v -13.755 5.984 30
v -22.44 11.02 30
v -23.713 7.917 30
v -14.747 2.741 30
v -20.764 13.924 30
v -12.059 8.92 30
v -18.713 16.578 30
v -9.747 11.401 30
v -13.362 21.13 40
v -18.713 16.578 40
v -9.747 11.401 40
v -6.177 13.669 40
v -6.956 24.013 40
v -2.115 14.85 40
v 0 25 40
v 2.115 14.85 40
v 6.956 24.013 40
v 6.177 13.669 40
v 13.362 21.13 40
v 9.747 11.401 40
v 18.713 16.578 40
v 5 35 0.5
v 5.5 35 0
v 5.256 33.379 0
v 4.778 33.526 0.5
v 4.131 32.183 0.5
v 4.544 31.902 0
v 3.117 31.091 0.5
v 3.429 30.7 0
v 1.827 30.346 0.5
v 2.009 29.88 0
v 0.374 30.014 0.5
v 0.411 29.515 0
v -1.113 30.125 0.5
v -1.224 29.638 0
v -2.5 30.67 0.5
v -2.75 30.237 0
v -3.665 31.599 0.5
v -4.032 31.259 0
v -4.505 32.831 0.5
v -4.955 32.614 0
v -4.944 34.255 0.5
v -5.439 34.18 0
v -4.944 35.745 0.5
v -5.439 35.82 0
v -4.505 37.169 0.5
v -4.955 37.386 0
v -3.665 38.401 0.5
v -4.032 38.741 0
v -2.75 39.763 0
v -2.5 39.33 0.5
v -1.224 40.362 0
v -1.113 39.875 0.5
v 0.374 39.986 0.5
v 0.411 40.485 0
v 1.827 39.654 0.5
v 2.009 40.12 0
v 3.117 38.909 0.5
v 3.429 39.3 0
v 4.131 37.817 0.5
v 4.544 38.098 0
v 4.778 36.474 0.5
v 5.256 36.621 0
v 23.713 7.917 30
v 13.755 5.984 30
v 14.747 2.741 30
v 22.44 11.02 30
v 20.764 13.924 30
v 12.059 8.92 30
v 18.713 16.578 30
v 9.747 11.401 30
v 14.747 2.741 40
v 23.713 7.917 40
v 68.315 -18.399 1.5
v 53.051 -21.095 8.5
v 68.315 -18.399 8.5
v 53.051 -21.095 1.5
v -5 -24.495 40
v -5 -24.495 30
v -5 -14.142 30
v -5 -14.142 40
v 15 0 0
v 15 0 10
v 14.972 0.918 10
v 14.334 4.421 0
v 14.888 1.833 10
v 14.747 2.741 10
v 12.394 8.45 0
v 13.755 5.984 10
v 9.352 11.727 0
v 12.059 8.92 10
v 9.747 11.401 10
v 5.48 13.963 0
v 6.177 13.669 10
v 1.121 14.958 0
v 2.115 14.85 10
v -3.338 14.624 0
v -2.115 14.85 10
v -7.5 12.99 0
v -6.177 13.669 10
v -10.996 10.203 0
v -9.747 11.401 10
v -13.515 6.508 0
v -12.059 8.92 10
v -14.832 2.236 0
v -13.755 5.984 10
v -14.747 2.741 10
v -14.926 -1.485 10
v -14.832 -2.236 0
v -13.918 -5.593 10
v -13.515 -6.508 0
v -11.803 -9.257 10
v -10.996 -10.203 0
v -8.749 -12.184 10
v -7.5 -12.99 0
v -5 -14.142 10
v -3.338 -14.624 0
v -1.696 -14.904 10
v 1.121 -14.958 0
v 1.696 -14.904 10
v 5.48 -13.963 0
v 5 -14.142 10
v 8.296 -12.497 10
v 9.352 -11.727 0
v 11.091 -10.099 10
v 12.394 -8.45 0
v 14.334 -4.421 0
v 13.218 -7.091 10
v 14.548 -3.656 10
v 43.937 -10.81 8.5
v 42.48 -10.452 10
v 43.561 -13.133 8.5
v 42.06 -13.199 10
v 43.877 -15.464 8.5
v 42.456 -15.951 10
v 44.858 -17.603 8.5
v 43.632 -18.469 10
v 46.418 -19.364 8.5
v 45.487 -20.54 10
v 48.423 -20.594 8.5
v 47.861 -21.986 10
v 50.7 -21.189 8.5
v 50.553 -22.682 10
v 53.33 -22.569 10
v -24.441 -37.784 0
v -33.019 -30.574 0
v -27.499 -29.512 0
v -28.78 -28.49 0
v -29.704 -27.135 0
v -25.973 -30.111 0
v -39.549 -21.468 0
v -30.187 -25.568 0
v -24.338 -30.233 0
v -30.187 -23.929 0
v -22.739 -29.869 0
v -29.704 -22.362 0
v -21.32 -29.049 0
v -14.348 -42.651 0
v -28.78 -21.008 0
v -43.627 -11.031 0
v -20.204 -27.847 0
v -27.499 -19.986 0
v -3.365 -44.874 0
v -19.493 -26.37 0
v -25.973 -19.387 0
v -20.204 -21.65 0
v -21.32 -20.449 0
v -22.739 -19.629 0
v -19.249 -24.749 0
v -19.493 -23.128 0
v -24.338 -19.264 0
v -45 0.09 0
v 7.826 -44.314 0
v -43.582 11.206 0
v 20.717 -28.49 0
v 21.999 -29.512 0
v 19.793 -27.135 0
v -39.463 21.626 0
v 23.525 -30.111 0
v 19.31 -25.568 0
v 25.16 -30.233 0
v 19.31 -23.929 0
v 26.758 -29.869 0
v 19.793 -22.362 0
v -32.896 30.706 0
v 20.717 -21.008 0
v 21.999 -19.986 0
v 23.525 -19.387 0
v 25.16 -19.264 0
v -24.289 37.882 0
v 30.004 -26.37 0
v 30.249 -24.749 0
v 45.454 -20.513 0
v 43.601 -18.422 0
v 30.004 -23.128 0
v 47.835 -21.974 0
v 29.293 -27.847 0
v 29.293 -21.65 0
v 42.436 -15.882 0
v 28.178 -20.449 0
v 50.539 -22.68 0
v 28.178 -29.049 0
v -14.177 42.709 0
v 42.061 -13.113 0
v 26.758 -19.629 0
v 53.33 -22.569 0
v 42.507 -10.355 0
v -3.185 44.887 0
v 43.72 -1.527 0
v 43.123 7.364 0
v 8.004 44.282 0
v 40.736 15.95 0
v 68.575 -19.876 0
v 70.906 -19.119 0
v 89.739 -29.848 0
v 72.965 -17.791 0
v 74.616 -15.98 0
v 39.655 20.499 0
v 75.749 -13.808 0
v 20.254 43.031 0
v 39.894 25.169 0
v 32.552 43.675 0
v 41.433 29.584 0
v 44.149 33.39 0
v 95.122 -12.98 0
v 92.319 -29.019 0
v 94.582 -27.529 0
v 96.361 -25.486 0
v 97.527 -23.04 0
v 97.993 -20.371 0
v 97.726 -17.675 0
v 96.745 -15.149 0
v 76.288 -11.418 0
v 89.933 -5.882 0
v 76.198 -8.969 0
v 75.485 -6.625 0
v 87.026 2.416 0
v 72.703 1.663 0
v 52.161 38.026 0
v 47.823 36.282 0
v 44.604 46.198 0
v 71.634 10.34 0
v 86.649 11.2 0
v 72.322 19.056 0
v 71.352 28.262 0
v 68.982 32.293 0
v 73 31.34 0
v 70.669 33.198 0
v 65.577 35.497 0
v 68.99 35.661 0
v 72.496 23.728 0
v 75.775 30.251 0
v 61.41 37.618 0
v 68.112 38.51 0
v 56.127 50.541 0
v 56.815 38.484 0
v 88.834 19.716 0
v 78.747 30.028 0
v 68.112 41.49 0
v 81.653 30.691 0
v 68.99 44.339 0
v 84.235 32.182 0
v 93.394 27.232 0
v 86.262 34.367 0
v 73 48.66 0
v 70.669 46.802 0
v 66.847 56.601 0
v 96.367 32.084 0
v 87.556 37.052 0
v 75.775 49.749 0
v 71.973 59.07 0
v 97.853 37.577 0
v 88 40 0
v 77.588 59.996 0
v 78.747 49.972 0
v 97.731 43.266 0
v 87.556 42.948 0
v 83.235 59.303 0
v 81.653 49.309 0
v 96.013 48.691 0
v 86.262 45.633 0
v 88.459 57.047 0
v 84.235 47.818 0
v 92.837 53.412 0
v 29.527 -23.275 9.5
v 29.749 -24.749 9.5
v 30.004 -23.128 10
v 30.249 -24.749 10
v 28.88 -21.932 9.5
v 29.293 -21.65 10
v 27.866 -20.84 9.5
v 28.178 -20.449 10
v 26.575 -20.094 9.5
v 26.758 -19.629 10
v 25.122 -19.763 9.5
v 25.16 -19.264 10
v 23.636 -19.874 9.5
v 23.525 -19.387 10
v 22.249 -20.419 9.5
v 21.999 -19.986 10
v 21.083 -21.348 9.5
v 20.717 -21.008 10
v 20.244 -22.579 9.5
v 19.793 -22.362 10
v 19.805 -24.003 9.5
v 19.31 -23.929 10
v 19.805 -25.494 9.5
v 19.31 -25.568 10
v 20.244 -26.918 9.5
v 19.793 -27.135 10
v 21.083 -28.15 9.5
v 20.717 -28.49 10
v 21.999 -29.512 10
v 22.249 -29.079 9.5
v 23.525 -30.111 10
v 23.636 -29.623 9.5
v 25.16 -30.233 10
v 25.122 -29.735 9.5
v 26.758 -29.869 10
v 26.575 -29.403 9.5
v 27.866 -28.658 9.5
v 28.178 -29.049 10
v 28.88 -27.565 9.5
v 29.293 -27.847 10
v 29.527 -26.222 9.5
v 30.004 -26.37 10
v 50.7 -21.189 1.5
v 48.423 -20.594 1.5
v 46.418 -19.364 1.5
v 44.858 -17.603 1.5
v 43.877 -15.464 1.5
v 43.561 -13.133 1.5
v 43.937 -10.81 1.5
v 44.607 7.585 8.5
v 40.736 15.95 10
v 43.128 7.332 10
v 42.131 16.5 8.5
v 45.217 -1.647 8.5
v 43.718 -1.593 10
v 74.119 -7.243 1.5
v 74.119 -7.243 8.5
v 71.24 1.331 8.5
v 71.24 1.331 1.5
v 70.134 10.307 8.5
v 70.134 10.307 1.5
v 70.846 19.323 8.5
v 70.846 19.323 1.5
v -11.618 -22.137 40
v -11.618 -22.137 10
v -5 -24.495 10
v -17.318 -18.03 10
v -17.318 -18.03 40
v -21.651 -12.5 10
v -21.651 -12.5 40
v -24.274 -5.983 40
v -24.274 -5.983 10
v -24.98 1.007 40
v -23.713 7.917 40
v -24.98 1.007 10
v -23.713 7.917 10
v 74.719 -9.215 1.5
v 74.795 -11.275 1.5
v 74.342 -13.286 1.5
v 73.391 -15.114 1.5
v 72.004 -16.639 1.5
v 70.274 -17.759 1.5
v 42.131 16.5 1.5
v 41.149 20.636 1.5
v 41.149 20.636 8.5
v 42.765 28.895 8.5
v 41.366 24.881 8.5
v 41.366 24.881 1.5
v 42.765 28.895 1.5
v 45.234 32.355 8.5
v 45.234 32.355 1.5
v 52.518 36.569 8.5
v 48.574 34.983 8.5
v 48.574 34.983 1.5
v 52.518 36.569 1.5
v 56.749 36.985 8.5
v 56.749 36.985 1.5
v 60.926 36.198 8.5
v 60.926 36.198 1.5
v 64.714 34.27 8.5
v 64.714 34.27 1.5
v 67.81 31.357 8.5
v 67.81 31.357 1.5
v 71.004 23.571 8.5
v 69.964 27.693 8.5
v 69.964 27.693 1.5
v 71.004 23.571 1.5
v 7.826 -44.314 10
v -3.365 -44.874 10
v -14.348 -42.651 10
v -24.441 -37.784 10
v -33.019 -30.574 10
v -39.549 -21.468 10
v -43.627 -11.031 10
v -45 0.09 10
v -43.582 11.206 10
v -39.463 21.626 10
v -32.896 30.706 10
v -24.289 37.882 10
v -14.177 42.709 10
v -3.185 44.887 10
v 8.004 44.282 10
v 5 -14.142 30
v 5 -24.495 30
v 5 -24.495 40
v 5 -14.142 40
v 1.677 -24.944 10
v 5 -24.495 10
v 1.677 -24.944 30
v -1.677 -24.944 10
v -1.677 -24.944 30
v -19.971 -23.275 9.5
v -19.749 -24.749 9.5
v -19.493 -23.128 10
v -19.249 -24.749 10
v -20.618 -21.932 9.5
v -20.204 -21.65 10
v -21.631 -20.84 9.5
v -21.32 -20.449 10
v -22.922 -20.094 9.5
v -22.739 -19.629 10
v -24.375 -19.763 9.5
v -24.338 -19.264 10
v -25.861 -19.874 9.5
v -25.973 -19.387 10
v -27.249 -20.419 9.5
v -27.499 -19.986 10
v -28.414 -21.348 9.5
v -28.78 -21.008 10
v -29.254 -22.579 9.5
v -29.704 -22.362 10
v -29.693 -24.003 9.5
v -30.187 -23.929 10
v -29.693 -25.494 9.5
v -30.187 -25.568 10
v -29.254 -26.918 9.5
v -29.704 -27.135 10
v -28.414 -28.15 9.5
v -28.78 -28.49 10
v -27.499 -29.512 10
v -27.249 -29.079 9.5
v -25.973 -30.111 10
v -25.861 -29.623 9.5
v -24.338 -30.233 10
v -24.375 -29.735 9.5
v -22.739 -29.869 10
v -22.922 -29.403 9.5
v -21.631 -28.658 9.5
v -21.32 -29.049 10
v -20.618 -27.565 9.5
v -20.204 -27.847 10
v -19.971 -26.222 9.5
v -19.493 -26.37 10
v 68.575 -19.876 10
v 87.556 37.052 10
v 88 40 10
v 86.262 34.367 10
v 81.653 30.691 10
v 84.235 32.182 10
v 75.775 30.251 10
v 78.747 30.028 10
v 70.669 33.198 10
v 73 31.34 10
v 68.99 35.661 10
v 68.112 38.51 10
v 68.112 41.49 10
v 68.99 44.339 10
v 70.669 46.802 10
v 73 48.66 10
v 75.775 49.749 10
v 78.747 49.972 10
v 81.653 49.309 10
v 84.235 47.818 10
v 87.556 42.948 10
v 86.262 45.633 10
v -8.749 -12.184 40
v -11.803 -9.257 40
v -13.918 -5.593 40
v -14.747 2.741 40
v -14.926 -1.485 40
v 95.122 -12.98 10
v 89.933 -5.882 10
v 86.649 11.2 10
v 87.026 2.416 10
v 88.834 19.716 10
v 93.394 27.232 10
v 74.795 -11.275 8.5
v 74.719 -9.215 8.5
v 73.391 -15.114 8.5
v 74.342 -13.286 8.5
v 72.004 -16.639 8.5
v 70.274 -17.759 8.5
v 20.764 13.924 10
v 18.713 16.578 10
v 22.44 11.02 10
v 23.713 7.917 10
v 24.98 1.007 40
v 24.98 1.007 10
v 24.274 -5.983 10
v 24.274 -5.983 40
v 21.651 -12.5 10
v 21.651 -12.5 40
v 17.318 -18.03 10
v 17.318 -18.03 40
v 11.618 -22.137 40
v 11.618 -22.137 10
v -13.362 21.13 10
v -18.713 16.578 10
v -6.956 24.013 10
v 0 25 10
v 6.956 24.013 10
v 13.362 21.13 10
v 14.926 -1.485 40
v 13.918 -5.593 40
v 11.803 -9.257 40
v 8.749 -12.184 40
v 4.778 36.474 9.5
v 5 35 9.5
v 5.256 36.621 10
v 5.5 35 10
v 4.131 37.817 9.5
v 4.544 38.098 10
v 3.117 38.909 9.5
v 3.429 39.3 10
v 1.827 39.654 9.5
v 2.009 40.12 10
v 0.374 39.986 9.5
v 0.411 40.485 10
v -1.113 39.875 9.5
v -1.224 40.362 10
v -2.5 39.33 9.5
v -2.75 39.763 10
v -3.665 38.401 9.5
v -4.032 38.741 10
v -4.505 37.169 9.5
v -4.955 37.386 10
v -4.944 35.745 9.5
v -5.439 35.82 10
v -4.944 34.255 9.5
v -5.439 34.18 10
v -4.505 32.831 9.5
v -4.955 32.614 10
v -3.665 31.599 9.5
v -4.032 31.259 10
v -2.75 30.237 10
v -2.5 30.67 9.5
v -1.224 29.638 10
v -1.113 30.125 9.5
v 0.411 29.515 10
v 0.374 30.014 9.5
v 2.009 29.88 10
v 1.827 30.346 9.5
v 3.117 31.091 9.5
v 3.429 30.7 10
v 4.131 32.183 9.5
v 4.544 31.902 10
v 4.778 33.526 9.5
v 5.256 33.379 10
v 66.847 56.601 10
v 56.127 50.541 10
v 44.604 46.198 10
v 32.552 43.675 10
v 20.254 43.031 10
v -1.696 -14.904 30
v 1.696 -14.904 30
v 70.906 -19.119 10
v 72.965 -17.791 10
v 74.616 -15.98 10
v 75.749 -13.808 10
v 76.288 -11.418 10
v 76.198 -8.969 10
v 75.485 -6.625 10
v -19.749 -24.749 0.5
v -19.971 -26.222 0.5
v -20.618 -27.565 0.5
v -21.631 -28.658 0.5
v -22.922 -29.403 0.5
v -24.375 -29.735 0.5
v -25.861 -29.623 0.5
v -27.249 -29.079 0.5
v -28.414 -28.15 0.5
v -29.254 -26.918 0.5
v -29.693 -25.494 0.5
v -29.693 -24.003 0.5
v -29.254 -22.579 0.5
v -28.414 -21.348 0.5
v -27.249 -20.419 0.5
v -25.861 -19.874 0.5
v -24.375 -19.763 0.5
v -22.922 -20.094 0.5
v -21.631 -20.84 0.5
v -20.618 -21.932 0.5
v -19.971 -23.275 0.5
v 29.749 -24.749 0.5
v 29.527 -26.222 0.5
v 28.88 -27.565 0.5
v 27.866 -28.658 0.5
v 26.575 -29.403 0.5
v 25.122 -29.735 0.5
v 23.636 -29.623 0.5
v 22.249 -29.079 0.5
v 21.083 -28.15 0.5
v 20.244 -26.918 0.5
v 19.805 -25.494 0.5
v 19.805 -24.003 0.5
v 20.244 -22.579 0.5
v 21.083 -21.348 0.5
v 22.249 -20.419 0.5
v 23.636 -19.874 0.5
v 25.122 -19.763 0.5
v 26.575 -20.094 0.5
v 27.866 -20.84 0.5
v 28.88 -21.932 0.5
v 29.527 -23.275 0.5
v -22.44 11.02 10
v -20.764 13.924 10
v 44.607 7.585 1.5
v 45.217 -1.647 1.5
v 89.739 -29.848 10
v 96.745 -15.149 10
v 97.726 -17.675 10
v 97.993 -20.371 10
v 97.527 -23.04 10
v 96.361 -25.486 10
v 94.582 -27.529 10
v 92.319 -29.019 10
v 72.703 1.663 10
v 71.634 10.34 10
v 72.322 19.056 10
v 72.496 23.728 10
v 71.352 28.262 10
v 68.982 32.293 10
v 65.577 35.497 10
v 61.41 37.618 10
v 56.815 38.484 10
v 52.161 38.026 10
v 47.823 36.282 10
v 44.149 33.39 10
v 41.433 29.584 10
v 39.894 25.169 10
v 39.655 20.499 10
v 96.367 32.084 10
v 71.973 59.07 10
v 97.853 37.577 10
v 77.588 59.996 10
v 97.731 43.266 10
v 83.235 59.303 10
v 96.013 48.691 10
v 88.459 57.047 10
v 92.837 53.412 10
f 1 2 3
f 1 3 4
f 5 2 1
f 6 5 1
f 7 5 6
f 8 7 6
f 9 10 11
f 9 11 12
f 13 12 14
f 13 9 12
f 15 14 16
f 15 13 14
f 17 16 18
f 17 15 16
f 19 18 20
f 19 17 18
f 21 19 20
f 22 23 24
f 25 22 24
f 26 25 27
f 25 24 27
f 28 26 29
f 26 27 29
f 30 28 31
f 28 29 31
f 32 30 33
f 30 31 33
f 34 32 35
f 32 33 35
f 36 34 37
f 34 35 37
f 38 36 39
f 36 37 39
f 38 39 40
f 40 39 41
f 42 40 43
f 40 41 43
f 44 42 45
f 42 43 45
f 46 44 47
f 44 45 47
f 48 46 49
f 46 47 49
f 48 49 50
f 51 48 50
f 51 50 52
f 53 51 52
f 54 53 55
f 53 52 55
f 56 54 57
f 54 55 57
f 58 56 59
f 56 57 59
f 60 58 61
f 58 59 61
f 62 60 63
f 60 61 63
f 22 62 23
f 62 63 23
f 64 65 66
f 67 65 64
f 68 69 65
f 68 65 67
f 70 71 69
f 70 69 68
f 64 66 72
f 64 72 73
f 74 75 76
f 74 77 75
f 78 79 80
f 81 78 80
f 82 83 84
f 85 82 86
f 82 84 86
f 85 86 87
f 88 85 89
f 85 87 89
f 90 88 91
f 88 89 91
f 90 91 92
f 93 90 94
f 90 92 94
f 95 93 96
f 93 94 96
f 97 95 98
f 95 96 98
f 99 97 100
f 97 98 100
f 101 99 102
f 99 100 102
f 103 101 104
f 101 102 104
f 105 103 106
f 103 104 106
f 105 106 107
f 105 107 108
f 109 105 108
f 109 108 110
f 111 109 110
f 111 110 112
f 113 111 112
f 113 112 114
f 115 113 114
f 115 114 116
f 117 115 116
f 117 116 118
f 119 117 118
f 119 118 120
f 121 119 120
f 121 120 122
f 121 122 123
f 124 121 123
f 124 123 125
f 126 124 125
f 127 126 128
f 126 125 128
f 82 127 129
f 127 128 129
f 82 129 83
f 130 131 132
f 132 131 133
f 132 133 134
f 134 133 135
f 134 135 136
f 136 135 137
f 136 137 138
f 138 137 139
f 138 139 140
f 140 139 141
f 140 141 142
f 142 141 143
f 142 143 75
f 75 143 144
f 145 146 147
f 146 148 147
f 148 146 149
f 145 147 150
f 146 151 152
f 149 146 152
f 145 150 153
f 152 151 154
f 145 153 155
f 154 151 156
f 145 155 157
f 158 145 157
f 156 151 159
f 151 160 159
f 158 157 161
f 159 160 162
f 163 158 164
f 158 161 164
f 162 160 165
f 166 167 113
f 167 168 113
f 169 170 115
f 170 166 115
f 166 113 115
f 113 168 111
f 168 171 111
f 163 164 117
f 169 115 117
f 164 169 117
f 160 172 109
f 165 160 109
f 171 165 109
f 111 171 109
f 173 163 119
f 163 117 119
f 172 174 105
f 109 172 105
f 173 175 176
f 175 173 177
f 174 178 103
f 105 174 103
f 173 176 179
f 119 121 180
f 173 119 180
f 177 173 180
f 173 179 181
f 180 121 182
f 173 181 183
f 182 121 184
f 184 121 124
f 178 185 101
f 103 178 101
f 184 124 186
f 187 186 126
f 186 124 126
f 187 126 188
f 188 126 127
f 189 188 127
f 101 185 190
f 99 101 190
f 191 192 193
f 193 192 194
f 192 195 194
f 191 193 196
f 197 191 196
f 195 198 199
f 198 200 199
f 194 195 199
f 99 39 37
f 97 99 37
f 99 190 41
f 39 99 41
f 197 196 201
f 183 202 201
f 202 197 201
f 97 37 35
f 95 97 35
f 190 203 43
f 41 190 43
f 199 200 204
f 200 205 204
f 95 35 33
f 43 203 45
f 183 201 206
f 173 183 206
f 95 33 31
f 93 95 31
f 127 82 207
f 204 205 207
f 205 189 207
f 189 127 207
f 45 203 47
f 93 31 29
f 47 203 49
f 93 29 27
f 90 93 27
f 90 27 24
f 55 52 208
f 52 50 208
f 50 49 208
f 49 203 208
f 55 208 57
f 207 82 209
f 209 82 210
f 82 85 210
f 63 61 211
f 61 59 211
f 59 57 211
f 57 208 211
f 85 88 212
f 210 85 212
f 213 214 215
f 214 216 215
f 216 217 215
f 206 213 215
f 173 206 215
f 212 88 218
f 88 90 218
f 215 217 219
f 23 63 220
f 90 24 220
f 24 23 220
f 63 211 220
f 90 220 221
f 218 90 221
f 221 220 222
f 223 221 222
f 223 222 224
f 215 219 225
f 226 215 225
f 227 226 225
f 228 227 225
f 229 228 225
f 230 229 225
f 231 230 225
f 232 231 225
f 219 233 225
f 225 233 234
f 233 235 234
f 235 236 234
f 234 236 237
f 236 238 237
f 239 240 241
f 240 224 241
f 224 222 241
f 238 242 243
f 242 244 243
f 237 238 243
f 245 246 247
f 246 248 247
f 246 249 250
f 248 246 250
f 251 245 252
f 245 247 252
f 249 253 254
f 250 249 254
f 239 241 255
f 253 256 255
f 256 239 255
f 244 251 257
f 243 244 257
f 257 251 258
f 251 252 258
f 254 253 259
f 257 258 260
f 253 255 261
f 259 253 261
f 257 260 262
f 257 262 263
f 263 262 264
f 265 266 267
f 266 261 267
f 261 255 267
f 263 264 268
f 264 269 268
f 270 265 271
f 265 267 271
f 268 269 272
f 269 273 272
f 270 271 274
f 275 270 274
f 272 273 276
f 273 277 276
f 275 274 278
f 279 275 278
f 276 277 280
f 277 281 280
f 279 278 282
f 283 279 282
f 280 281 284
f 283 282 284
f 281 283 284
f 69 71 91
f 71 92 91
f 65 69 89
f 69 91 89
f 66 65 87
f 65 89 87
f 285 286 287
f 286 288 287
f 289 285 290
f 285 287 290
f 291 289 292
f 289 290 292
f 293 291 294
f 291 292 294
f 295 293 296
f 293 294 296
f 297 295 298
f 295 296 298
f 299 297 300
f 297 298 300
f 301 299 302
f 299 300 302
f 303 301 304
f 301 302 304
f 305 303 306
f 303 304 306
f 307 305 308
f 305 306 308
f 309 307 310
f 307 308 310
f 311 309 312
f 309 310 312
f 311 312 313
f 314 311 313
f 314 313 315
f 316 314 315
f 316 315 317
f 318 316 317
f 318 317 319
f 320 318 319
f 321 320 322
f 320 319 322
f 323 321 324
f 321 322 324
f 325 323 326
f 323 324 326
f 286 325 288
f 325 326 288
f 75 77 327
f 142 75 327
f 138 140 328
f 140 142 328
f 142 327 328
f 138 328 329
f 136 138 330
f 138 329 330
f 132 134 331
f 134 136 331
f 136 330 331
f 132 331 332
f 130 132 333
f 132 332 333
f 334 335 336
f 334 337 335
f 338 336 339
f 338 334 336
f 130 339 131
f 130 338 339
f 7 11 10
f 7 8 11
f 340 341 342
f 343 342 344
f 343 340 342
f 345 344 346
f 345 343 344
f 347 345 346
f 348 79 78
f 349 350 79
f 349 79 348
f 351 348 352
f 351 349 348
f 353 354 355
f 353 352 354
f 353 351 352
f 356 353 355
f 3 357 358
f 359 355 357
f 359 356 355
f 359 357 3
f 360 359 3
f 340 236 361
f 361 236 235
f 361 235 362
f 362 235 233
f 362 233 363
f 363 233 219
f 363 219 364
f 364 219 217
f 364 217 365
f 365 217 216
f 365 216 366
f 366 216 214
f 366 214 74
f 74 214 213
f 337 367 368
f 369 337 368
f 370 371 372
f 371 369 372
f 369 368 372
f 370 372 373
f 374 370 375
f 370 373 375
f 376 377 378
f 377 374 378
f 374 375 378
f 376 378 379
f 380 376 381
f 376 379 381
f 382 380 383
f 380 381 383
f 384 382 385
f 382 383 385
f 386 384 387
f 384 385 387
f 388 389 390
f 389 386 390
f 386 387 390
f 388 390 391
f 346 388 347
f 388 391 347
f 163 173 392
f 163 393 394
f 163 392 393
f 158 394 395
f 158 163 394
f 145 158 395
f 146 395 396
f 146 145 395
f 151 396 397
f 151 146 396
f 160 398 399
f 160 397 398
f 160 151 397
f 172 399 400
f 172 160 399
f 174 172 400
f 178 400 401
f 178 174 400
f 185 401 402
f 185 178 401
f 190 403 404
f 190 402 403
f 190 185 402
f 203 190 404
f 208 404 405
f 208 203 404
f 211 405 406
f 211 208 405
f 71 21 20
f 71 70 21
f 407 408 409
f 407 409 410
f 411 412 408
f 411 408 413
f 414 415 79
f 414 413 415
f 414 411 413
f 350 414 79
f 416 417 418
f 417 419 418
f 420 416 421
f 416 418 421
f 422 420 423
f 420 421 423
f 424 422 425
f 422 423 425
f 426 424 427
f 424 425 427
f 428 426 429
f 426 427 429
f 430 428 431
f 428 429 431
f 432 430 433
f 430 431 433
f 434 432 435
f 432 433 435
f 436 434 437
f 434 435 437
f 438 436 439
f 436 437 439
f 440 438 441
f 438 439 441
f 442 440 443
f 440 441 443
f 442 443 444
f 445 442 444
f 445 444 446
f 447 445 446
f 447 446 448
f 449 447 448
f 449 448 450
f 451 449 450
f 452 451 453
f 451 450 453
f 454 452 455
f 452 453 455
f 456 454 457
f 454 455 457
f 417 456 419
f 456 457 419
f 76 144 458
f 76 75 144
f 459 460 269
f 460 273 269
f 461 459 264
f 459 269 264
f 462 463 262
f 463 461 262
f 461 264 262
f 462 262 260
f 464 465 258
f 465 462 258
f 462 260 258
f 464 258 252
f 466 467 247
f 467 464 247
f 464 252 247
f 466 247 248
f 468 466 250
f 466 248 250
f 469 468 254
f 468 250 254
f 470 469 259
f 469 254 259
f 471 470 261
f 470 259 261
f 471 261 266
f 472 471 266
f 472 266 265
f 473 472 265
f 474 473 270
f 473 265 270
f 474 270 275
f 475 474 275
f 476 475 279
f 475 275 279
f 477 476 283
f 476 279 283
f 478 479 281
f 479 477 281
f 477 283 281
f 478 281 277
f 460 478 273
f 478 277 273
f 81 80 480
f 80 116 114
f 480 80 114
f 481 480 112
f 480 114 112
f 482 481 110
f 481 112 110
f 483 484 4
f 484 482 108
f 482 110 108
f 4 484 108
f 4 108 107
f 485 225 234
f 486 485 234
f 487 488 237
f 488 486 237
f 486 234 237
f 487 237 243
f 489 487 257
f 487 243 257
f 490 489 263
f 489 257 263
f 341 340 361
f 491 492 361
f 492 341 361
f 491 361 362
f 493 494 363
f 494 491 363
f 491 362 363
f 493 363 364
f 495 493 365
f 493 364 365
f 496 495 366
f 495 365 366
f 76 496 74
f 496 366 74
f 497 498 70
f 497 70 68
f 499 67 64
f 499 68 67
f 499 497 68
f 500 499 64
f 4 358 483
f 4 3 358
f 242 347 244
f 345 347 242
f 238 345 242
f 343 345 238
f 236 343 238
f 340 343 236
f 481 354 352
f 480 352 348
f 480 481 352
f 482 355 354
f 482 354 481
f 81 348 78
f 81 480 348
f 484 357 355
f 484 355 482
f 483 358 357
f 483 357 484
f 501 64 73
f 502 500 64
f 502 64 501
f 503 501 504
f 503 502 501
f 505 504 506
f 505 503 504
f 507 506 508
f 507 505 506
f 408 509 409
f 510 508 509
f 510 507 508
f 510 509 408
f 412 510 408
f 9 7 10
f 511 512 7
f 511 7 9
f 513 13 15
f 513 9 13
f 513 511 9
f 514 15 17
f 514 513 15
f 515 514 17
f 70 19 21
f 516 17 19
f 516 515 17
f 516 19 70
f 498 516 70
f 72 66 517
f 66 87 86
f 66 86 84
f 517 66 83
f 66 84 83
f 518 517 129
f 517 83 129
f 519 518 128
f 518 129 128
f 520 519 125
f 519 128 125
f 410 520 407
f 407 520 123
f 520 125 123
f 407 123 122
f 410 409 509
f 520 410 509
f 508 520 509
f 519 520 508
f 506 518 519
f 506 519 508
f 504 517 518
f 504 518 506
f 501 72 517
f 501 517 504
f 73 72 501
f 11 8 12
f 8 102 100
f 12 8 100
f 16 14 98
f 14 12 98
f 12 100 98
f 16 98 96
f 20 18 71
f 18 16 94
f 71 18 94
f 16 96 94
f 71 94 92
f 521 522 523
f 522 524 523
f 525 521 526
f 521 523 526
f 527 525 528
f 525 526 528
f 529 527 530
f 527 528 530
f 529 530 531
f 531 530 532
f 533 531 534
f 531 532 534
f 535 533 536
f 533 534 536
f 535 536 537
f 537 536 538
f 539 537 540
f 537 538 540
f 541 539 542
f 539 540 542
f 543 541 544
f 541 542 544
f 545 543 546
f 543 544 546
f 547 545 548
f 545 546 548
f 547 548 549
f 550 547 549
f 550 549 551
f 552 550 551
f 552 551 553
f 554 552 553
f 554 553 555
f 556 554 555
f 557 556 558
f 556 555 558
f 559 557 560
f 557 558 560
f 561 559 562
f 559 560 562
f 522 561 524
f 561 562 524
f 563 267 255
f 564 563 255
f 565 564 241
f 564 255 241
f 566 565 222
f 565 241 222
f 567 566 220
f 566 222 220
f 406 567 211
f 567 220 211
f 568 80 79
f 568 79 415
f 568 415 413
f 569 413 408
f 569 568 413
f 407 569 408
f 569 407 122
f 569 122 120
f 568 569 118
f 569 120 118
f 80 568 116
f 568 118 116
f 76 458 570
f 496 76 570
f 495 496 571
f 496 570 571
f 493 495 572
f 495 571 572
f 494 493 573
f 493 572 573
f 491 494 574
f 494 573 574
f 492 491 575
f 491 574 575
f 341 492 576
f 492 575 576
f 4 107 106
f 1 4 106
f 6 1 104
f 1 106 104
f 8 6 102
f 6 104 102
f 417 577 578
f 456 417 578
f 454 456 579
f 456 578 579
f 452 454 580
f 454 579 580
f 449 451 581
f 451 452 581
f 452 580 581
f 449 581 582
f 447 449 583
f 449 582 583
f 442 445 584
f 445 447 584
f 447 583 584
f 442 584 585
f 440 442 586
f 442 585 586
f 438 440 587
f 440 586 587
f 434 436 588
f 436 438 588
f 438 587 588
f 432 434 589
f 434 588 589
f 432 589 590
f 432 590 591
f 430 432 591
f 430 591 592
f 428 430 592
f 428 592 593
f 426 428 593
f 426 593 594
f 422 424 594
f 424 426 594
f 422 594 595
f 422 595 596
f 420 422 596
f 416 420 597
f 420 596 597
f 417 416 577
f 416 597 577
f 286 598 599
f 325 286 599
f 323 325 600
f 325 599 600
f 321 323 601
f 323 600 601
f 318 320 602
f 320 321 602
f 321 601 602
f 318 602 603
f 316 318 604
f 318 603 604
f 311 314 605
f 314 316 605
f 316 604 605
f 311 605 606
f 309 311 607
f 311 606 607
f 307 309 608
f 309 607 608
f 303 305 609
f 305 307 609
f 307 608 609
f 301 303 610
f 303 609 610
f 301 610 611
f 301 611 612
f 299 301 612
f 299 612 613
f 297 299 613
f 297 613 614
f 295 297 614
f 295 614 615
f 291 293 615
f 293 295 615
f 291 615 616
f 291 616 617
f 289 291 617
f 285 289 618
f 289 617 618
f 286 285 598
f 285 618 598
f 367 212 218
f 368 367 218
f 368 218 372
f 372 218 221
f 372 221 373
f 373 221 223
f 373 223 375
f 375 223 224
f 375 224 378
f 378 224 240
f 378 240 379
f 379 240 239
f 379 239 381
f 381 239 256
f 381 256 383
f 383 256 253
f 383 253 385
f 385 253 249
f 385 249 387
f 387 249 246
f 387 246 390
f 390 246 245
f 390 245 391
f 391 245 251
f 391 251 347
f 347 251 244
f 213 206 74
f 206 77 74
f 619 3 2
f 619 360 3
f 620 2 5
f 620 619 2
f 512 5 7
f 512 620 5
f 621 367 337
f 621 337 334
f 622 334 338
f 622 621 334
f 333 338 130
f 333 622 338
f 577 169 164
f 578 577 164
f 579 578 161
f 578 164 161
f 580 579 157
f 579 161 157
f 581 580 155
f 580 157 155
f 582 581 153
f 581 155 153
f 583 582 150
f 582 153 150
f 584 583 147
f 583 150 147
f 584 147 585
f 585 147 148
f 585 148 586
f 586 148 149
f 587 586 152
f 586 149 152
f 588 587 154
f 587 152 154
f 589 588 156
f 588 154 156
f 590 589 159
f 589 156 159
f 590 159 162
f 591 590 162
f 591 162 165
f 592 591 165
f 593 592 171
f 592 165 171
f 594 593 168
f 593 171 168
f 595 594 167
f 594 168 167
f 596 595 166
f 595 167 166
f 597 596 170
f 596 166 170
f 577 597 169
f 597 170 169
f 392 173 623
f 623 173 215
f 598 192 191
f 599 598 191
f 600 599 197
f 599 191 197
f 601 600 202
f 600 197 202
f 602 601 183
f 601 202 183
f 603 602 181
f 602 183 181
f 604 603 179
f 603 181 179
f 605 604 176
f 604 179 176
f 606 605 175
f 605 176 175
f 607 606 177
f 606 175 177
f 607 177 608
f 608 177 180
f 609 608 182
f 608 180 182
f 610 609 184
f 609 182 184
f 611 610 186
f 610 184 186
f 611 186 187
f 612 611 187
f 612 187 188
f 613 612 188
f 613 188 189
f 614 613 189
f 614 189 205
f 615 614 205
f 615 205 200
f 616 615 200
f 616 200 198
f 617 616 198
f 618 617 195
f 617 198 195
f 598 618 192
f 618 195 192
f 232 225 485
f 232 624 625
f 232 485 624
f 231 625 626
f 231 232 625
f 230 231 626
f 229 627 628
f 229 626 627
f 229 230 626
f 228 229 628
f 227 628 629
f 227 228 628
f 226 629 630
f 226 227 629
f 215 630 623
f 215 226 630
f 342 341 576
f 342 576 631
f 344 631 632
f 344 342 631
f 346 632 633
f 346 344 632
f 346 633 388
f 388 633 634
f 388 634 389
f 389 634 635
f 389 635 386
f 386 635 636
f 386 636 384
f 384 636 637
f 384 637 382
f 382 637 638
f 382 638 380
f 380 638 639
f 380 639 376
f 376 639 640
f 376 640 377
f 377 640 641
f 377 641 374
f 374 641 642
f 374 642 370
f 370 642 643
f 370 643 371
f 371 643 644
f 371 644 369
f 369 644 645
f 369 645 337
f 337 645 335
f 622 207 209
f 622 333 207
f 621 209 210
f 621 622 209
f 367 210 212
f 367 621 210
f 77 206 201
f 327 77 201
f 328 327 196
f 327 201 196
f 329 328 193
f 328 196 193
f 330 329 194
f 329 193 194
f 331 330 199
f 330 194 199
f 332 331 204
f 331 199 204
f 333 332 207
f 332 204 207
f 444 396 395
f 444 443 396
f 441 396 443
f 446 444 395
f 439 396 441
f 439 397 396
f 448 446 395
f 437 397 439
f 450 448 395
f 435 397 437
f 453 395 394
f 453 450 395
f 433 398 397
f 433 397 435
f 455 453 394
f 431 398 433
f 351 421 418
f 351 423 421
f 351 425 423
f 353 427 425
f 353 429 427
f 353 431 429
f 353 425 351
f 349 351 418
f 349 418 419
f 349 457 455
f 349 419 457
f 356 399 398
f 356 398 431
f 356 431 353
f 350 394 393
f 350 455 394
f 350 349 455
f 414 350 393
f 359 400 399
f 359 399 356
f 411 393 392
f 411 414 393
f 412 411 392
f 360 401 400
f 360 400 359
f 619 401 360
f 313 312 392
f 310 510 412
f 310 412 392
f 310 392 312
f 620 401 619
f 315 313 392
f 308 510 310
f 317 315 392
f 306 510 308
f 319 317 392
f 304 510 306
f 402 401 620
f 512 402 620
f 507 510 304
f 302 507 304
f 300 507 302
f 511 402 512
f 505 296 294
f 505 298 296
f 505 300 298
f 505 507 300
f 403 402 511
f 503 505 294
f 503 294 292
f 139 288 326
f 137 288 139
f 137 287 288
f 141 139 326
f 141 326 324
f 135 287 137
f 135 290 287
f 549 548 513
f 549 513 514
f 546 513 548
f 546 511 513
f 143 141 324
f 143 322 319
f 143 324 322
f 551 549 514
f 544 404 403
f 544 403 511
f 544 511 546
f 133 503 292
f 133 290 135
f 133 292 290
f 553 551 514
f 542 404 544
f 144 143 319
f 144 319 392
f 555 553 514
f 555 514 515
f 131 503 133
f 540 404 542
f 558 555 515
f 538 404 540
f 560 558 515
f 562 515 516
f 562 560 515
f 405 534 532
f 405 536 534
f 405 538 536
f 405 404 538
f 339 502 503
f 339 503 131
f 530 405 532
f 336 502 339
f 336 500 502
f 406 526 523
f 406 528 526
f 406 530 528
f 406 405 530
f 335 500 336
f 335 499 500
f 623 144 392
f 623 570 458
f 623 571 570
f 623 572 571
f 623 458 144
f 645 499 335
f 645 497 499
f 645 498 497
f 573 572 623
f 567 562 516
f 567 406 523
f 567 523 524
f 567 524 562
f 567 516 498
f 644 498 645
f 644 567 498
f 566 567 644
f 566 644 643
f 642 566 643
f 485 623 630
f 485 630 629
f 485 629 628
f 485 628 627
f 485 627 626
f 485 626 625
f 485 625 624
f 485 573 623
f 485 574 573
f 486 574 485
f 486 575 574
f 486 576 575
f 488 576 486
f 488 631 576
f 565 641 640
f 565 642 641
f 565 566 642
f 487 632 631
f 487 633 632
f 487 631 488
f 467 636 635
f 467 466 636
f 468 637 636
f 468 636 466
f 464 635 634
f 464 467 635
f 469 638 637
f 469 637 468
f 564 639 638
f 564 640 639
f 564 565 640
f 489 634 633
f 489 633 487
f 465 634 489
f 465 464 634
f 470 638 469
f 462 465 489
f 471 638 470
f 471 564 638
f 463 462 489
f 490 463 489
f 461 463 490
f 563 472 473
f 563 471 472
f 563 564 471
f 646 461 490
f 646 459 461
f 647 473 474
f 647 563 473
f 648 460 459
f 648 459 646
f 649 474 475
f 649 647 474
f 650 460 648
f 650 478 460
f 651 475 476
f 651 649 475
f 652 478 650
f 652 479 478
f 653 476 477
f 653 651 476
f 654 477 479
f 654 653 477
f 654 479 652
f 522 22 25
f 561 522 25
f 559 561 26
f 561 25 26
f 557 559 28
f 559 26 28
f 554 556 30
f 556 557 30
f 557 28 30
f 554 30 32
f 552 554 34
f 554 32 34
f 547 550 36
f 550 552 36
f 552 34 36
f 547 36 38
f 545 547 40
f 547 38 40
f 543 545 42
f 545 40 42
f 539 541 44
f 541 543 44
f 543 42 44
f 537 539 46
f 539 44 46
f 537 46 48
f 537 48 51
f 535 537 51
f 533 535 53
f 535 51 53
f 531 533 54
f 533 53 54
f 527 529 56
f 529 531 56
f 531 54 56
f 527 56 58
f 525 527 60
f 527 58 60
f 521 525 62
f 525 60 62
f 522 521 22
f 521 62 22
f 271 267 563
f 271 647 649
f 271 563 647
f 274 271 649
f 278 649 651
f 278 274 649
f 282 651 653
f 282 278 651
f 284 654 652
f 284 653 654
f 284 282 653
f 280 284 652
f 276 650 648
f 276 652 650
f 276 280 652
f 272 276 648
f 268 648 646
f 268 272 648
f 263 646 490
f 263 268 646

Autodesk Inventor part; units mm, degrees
ref_plane "YZ Plane" through (0, 0, 0) normal (1, 0, 0) x (0, 1, 0)
ref_plane "XZ Plane" through (0, 0, 0) normal (0, 1, 0) x (-1, 0, 0)
ref_plane "XY Plane" through (0, 0, 0) normal (0, 0, 1) x (1, 0, 0)
sketch "Sketch1" plane through (0, 0, 0) normal (0, 0, 1) x (1, 0, 0)
  arc A0 (8.0041, 44.2824) -> (7.8263, -44.3142) centre (0, 0) ccw
  arc A1 (8.0041, 44.2824) -> (66.8467, 56.6014) centre (22.2337, 123.0068) ccw
  arc A2 (93.3944, 27.2324) -> (66.8467, 56.6014) centre (78, 40) ccw
  arc A3 (89.7392, -29.8476) -> (95.1215, -12.9797) centre (88, -20) ccw
  arc A4 (93.3944, 27.2324) -> (95.1215, -12.9797) centre (116.4861, 8.081) ccw
  line L0 (7.8263, -44.3142) -> (89.7392, -29.8476)
  circle A5 centre (78, 40) radius 10
  arc A6 (70.8456, 19.3234) -> (42.1311, 16.5) centre (56.0864, 22) ccw
  arc A7 (43.9366, -10.8099) -> (53.0508, -21.095) centre (51.5602, -13.2351) ccw
  line L1 (53.0508, -21.095) -> (68.3146, -18.3992)
  arc A8 (68.3146, -18.3992) -> (74.1186, -7.243) centre (66.8289, -10.5384) ccw
  arc A9 (70.8456, 19.3234) -> (74.1186, -7.243) centre (115.1234, 11.2936) ccw
  arc A10 (8.0041, 44.2824) -> (7.8263, -44.3142) centre (0, 0) ccw
  arc A11 (43.9366, -10.8099) -> (42.1311, 16.5) centre (0, 0) ccw
  circle A12 centre (0, 35) radius 5
  line L2 (0, 0) -> (35, 0) construction
  circle A13 centre (-24.7487, -24.7487) radius 5
  circle A14 centre (24.7487, -24.7487) radius 5
  dimension "d1" = 160
  dimension "d2" = 40
  dimension "d3" = 40
  dimension "d4" = 78
  dimension "d6" = 20
  dimension "d7" = 88
  dimension "d8" = 20
  dimension "d9" = 60
  dimension "d10" = 20
  dimension "d12" = 30
  dimension "d13" = 22
  dimension "d22" = 16
  dimension "d23" = 15.5
  dimension "d26" = 90
  dimension "d29" = 10
  dimension "d32" = 10
  dimension "d33" = 10
  dimension "d76" = 15
extrude "Extrusion1" add sketch "Sketch1" along normal blind 10
sketch "Sketch2" plane through (0, 0, 10) normal (0, 0, 1) x (1, 0, 0)
  circle A0 centre (0, 0) radius 25
  circle A1 centre (0, 0) radius 15
  line L0 (0, 0) -> (25, 0) construction
  line L1 (0, 0) -> (25, 0) construction
  line L2 (-5, -15) -> (-5, -24.4949)
  line L3 (5, -24.4949) -> (5, -15)
  line L4 (-5, -15) -> (-5, -14.1421)
  line L5 (5, -15) -> (5, -14.1421)
  line L6 (0, 0) -> (30, 0) construction
  line L7 (0, 0) -> (30, 0) construction
  line L8 (-23.7132, 7.9173) -> (-14.7474, 2.7409)
  line L9 (-9.7474, 11.4012) -> (-18.7132, 16.5776)
  line L10 (18.7132, 16.5776) -> (9.7474, 11.4012)
  line L11 (14.7474, 2.7409) -> (23.7132, 7.9173)
  dimension "d36" = 50
  dimension "d37" = 30
  dimension "d59" = 10
extrude "Extrusion2" add sketch "Sketch2" along normal blind 30 contours A0 L3 L5 A1 L11 | L10 A1 L9 A0 | A0 L8 A1 L4 L2
chamfer "Chamfer1" distance 0.5 angle 45 6 edges at (-29.7487, -24.7487, 10) (-5, 35, 10) (19.7487, -24.7487, 0) (19.7487, -24.7487, 10) (-29.7487, -24.7487, 0) (-5, 35, 0)
chamfer "Chamfer2" distance 1.5 angle 45 6 edges at (45.5728, -18.5409, 0) (45.1483, 2.9848, 0) (54.6186, 36.928, 0) (70.4611, 5.7912, 0) (73.9259, -14.2306, 0) (60.6827, -19.7471, 0)
sketch "Sketch3" plane through (0, 0, 10) normal (0, 0, 1) x (1, 0, 0)
  line L0 (23.7132, 7.9173) -> (14.7474, 2.7409) projected
  circle A0 centre (0, 0) radius 25
  circle A1 centre (0, 0) radius 15
  line L1 (9.7474, 11.4012) -> (18.7132, 16.5776) projected
  line L2 (9.7474, 11.4012) -> (18.7132, 16.5776)
  line L3 (14.7474, 2.7409) -> (23.7132, 7.9173)
  line L4 (5, -14.1421) -> (5, -24.4949)
  line L5 (-5, -24.4949) -> (-5, -14.1421) projected
  line L6 (-5, -14.1421) -> (-5, -24.4949)
  line L7 (-14.7474, 2.7409) -> (-23.7132, 7.9173) projected
  line L8 (-23.7132, 7.9173) -> (-14.7474, 2.7409)
  line L9 (-18.7132, 16.5776) -> (-9.7474, 11.4012) projected
  line L10 (-18.7132, 16.5776) -> (-9.7474, 11.4012)
extrude "Extrusion3" add sketch "Sketch3" along normal blind 20 contours L0 A1 L1 A0 | A0 L5 A1 L4 | L9 A1 L7 A0
sketch "Sketch4" plane through (0, 0, 10) normal (0, 0, 1) x (1, 0, 0)
  circle A0 centre (0, 0) radius 15
extrude "Extrusion4" cut sketch "Sketch4" against normal blind 10
thread "Thread1" size "M10x1.5" class "6H" standard "ANSI Metric M Profile" length 23.2
thread "Thread2" size "M10x1.5" class "6H" standard "ANSI Metric M Profile" length 23.2
thread "Thread3" size "M10x1.5" class "6H" standard "ANSI Metric M Profile" length 23.2
chamfer "Chamfer4" distance 1.5 angle 45 6 edges at (54.6186, 36.928, 10) (70.4611, 5.7912, 10) (73.9259, -14.2306, 10) (45.1483, 2.9848, 10) (45.5728, -18.5409, 10) (60.6827, -19.7471, 10)
properties part number "Curved Disc new" material "Steel, Mild, Welded"
